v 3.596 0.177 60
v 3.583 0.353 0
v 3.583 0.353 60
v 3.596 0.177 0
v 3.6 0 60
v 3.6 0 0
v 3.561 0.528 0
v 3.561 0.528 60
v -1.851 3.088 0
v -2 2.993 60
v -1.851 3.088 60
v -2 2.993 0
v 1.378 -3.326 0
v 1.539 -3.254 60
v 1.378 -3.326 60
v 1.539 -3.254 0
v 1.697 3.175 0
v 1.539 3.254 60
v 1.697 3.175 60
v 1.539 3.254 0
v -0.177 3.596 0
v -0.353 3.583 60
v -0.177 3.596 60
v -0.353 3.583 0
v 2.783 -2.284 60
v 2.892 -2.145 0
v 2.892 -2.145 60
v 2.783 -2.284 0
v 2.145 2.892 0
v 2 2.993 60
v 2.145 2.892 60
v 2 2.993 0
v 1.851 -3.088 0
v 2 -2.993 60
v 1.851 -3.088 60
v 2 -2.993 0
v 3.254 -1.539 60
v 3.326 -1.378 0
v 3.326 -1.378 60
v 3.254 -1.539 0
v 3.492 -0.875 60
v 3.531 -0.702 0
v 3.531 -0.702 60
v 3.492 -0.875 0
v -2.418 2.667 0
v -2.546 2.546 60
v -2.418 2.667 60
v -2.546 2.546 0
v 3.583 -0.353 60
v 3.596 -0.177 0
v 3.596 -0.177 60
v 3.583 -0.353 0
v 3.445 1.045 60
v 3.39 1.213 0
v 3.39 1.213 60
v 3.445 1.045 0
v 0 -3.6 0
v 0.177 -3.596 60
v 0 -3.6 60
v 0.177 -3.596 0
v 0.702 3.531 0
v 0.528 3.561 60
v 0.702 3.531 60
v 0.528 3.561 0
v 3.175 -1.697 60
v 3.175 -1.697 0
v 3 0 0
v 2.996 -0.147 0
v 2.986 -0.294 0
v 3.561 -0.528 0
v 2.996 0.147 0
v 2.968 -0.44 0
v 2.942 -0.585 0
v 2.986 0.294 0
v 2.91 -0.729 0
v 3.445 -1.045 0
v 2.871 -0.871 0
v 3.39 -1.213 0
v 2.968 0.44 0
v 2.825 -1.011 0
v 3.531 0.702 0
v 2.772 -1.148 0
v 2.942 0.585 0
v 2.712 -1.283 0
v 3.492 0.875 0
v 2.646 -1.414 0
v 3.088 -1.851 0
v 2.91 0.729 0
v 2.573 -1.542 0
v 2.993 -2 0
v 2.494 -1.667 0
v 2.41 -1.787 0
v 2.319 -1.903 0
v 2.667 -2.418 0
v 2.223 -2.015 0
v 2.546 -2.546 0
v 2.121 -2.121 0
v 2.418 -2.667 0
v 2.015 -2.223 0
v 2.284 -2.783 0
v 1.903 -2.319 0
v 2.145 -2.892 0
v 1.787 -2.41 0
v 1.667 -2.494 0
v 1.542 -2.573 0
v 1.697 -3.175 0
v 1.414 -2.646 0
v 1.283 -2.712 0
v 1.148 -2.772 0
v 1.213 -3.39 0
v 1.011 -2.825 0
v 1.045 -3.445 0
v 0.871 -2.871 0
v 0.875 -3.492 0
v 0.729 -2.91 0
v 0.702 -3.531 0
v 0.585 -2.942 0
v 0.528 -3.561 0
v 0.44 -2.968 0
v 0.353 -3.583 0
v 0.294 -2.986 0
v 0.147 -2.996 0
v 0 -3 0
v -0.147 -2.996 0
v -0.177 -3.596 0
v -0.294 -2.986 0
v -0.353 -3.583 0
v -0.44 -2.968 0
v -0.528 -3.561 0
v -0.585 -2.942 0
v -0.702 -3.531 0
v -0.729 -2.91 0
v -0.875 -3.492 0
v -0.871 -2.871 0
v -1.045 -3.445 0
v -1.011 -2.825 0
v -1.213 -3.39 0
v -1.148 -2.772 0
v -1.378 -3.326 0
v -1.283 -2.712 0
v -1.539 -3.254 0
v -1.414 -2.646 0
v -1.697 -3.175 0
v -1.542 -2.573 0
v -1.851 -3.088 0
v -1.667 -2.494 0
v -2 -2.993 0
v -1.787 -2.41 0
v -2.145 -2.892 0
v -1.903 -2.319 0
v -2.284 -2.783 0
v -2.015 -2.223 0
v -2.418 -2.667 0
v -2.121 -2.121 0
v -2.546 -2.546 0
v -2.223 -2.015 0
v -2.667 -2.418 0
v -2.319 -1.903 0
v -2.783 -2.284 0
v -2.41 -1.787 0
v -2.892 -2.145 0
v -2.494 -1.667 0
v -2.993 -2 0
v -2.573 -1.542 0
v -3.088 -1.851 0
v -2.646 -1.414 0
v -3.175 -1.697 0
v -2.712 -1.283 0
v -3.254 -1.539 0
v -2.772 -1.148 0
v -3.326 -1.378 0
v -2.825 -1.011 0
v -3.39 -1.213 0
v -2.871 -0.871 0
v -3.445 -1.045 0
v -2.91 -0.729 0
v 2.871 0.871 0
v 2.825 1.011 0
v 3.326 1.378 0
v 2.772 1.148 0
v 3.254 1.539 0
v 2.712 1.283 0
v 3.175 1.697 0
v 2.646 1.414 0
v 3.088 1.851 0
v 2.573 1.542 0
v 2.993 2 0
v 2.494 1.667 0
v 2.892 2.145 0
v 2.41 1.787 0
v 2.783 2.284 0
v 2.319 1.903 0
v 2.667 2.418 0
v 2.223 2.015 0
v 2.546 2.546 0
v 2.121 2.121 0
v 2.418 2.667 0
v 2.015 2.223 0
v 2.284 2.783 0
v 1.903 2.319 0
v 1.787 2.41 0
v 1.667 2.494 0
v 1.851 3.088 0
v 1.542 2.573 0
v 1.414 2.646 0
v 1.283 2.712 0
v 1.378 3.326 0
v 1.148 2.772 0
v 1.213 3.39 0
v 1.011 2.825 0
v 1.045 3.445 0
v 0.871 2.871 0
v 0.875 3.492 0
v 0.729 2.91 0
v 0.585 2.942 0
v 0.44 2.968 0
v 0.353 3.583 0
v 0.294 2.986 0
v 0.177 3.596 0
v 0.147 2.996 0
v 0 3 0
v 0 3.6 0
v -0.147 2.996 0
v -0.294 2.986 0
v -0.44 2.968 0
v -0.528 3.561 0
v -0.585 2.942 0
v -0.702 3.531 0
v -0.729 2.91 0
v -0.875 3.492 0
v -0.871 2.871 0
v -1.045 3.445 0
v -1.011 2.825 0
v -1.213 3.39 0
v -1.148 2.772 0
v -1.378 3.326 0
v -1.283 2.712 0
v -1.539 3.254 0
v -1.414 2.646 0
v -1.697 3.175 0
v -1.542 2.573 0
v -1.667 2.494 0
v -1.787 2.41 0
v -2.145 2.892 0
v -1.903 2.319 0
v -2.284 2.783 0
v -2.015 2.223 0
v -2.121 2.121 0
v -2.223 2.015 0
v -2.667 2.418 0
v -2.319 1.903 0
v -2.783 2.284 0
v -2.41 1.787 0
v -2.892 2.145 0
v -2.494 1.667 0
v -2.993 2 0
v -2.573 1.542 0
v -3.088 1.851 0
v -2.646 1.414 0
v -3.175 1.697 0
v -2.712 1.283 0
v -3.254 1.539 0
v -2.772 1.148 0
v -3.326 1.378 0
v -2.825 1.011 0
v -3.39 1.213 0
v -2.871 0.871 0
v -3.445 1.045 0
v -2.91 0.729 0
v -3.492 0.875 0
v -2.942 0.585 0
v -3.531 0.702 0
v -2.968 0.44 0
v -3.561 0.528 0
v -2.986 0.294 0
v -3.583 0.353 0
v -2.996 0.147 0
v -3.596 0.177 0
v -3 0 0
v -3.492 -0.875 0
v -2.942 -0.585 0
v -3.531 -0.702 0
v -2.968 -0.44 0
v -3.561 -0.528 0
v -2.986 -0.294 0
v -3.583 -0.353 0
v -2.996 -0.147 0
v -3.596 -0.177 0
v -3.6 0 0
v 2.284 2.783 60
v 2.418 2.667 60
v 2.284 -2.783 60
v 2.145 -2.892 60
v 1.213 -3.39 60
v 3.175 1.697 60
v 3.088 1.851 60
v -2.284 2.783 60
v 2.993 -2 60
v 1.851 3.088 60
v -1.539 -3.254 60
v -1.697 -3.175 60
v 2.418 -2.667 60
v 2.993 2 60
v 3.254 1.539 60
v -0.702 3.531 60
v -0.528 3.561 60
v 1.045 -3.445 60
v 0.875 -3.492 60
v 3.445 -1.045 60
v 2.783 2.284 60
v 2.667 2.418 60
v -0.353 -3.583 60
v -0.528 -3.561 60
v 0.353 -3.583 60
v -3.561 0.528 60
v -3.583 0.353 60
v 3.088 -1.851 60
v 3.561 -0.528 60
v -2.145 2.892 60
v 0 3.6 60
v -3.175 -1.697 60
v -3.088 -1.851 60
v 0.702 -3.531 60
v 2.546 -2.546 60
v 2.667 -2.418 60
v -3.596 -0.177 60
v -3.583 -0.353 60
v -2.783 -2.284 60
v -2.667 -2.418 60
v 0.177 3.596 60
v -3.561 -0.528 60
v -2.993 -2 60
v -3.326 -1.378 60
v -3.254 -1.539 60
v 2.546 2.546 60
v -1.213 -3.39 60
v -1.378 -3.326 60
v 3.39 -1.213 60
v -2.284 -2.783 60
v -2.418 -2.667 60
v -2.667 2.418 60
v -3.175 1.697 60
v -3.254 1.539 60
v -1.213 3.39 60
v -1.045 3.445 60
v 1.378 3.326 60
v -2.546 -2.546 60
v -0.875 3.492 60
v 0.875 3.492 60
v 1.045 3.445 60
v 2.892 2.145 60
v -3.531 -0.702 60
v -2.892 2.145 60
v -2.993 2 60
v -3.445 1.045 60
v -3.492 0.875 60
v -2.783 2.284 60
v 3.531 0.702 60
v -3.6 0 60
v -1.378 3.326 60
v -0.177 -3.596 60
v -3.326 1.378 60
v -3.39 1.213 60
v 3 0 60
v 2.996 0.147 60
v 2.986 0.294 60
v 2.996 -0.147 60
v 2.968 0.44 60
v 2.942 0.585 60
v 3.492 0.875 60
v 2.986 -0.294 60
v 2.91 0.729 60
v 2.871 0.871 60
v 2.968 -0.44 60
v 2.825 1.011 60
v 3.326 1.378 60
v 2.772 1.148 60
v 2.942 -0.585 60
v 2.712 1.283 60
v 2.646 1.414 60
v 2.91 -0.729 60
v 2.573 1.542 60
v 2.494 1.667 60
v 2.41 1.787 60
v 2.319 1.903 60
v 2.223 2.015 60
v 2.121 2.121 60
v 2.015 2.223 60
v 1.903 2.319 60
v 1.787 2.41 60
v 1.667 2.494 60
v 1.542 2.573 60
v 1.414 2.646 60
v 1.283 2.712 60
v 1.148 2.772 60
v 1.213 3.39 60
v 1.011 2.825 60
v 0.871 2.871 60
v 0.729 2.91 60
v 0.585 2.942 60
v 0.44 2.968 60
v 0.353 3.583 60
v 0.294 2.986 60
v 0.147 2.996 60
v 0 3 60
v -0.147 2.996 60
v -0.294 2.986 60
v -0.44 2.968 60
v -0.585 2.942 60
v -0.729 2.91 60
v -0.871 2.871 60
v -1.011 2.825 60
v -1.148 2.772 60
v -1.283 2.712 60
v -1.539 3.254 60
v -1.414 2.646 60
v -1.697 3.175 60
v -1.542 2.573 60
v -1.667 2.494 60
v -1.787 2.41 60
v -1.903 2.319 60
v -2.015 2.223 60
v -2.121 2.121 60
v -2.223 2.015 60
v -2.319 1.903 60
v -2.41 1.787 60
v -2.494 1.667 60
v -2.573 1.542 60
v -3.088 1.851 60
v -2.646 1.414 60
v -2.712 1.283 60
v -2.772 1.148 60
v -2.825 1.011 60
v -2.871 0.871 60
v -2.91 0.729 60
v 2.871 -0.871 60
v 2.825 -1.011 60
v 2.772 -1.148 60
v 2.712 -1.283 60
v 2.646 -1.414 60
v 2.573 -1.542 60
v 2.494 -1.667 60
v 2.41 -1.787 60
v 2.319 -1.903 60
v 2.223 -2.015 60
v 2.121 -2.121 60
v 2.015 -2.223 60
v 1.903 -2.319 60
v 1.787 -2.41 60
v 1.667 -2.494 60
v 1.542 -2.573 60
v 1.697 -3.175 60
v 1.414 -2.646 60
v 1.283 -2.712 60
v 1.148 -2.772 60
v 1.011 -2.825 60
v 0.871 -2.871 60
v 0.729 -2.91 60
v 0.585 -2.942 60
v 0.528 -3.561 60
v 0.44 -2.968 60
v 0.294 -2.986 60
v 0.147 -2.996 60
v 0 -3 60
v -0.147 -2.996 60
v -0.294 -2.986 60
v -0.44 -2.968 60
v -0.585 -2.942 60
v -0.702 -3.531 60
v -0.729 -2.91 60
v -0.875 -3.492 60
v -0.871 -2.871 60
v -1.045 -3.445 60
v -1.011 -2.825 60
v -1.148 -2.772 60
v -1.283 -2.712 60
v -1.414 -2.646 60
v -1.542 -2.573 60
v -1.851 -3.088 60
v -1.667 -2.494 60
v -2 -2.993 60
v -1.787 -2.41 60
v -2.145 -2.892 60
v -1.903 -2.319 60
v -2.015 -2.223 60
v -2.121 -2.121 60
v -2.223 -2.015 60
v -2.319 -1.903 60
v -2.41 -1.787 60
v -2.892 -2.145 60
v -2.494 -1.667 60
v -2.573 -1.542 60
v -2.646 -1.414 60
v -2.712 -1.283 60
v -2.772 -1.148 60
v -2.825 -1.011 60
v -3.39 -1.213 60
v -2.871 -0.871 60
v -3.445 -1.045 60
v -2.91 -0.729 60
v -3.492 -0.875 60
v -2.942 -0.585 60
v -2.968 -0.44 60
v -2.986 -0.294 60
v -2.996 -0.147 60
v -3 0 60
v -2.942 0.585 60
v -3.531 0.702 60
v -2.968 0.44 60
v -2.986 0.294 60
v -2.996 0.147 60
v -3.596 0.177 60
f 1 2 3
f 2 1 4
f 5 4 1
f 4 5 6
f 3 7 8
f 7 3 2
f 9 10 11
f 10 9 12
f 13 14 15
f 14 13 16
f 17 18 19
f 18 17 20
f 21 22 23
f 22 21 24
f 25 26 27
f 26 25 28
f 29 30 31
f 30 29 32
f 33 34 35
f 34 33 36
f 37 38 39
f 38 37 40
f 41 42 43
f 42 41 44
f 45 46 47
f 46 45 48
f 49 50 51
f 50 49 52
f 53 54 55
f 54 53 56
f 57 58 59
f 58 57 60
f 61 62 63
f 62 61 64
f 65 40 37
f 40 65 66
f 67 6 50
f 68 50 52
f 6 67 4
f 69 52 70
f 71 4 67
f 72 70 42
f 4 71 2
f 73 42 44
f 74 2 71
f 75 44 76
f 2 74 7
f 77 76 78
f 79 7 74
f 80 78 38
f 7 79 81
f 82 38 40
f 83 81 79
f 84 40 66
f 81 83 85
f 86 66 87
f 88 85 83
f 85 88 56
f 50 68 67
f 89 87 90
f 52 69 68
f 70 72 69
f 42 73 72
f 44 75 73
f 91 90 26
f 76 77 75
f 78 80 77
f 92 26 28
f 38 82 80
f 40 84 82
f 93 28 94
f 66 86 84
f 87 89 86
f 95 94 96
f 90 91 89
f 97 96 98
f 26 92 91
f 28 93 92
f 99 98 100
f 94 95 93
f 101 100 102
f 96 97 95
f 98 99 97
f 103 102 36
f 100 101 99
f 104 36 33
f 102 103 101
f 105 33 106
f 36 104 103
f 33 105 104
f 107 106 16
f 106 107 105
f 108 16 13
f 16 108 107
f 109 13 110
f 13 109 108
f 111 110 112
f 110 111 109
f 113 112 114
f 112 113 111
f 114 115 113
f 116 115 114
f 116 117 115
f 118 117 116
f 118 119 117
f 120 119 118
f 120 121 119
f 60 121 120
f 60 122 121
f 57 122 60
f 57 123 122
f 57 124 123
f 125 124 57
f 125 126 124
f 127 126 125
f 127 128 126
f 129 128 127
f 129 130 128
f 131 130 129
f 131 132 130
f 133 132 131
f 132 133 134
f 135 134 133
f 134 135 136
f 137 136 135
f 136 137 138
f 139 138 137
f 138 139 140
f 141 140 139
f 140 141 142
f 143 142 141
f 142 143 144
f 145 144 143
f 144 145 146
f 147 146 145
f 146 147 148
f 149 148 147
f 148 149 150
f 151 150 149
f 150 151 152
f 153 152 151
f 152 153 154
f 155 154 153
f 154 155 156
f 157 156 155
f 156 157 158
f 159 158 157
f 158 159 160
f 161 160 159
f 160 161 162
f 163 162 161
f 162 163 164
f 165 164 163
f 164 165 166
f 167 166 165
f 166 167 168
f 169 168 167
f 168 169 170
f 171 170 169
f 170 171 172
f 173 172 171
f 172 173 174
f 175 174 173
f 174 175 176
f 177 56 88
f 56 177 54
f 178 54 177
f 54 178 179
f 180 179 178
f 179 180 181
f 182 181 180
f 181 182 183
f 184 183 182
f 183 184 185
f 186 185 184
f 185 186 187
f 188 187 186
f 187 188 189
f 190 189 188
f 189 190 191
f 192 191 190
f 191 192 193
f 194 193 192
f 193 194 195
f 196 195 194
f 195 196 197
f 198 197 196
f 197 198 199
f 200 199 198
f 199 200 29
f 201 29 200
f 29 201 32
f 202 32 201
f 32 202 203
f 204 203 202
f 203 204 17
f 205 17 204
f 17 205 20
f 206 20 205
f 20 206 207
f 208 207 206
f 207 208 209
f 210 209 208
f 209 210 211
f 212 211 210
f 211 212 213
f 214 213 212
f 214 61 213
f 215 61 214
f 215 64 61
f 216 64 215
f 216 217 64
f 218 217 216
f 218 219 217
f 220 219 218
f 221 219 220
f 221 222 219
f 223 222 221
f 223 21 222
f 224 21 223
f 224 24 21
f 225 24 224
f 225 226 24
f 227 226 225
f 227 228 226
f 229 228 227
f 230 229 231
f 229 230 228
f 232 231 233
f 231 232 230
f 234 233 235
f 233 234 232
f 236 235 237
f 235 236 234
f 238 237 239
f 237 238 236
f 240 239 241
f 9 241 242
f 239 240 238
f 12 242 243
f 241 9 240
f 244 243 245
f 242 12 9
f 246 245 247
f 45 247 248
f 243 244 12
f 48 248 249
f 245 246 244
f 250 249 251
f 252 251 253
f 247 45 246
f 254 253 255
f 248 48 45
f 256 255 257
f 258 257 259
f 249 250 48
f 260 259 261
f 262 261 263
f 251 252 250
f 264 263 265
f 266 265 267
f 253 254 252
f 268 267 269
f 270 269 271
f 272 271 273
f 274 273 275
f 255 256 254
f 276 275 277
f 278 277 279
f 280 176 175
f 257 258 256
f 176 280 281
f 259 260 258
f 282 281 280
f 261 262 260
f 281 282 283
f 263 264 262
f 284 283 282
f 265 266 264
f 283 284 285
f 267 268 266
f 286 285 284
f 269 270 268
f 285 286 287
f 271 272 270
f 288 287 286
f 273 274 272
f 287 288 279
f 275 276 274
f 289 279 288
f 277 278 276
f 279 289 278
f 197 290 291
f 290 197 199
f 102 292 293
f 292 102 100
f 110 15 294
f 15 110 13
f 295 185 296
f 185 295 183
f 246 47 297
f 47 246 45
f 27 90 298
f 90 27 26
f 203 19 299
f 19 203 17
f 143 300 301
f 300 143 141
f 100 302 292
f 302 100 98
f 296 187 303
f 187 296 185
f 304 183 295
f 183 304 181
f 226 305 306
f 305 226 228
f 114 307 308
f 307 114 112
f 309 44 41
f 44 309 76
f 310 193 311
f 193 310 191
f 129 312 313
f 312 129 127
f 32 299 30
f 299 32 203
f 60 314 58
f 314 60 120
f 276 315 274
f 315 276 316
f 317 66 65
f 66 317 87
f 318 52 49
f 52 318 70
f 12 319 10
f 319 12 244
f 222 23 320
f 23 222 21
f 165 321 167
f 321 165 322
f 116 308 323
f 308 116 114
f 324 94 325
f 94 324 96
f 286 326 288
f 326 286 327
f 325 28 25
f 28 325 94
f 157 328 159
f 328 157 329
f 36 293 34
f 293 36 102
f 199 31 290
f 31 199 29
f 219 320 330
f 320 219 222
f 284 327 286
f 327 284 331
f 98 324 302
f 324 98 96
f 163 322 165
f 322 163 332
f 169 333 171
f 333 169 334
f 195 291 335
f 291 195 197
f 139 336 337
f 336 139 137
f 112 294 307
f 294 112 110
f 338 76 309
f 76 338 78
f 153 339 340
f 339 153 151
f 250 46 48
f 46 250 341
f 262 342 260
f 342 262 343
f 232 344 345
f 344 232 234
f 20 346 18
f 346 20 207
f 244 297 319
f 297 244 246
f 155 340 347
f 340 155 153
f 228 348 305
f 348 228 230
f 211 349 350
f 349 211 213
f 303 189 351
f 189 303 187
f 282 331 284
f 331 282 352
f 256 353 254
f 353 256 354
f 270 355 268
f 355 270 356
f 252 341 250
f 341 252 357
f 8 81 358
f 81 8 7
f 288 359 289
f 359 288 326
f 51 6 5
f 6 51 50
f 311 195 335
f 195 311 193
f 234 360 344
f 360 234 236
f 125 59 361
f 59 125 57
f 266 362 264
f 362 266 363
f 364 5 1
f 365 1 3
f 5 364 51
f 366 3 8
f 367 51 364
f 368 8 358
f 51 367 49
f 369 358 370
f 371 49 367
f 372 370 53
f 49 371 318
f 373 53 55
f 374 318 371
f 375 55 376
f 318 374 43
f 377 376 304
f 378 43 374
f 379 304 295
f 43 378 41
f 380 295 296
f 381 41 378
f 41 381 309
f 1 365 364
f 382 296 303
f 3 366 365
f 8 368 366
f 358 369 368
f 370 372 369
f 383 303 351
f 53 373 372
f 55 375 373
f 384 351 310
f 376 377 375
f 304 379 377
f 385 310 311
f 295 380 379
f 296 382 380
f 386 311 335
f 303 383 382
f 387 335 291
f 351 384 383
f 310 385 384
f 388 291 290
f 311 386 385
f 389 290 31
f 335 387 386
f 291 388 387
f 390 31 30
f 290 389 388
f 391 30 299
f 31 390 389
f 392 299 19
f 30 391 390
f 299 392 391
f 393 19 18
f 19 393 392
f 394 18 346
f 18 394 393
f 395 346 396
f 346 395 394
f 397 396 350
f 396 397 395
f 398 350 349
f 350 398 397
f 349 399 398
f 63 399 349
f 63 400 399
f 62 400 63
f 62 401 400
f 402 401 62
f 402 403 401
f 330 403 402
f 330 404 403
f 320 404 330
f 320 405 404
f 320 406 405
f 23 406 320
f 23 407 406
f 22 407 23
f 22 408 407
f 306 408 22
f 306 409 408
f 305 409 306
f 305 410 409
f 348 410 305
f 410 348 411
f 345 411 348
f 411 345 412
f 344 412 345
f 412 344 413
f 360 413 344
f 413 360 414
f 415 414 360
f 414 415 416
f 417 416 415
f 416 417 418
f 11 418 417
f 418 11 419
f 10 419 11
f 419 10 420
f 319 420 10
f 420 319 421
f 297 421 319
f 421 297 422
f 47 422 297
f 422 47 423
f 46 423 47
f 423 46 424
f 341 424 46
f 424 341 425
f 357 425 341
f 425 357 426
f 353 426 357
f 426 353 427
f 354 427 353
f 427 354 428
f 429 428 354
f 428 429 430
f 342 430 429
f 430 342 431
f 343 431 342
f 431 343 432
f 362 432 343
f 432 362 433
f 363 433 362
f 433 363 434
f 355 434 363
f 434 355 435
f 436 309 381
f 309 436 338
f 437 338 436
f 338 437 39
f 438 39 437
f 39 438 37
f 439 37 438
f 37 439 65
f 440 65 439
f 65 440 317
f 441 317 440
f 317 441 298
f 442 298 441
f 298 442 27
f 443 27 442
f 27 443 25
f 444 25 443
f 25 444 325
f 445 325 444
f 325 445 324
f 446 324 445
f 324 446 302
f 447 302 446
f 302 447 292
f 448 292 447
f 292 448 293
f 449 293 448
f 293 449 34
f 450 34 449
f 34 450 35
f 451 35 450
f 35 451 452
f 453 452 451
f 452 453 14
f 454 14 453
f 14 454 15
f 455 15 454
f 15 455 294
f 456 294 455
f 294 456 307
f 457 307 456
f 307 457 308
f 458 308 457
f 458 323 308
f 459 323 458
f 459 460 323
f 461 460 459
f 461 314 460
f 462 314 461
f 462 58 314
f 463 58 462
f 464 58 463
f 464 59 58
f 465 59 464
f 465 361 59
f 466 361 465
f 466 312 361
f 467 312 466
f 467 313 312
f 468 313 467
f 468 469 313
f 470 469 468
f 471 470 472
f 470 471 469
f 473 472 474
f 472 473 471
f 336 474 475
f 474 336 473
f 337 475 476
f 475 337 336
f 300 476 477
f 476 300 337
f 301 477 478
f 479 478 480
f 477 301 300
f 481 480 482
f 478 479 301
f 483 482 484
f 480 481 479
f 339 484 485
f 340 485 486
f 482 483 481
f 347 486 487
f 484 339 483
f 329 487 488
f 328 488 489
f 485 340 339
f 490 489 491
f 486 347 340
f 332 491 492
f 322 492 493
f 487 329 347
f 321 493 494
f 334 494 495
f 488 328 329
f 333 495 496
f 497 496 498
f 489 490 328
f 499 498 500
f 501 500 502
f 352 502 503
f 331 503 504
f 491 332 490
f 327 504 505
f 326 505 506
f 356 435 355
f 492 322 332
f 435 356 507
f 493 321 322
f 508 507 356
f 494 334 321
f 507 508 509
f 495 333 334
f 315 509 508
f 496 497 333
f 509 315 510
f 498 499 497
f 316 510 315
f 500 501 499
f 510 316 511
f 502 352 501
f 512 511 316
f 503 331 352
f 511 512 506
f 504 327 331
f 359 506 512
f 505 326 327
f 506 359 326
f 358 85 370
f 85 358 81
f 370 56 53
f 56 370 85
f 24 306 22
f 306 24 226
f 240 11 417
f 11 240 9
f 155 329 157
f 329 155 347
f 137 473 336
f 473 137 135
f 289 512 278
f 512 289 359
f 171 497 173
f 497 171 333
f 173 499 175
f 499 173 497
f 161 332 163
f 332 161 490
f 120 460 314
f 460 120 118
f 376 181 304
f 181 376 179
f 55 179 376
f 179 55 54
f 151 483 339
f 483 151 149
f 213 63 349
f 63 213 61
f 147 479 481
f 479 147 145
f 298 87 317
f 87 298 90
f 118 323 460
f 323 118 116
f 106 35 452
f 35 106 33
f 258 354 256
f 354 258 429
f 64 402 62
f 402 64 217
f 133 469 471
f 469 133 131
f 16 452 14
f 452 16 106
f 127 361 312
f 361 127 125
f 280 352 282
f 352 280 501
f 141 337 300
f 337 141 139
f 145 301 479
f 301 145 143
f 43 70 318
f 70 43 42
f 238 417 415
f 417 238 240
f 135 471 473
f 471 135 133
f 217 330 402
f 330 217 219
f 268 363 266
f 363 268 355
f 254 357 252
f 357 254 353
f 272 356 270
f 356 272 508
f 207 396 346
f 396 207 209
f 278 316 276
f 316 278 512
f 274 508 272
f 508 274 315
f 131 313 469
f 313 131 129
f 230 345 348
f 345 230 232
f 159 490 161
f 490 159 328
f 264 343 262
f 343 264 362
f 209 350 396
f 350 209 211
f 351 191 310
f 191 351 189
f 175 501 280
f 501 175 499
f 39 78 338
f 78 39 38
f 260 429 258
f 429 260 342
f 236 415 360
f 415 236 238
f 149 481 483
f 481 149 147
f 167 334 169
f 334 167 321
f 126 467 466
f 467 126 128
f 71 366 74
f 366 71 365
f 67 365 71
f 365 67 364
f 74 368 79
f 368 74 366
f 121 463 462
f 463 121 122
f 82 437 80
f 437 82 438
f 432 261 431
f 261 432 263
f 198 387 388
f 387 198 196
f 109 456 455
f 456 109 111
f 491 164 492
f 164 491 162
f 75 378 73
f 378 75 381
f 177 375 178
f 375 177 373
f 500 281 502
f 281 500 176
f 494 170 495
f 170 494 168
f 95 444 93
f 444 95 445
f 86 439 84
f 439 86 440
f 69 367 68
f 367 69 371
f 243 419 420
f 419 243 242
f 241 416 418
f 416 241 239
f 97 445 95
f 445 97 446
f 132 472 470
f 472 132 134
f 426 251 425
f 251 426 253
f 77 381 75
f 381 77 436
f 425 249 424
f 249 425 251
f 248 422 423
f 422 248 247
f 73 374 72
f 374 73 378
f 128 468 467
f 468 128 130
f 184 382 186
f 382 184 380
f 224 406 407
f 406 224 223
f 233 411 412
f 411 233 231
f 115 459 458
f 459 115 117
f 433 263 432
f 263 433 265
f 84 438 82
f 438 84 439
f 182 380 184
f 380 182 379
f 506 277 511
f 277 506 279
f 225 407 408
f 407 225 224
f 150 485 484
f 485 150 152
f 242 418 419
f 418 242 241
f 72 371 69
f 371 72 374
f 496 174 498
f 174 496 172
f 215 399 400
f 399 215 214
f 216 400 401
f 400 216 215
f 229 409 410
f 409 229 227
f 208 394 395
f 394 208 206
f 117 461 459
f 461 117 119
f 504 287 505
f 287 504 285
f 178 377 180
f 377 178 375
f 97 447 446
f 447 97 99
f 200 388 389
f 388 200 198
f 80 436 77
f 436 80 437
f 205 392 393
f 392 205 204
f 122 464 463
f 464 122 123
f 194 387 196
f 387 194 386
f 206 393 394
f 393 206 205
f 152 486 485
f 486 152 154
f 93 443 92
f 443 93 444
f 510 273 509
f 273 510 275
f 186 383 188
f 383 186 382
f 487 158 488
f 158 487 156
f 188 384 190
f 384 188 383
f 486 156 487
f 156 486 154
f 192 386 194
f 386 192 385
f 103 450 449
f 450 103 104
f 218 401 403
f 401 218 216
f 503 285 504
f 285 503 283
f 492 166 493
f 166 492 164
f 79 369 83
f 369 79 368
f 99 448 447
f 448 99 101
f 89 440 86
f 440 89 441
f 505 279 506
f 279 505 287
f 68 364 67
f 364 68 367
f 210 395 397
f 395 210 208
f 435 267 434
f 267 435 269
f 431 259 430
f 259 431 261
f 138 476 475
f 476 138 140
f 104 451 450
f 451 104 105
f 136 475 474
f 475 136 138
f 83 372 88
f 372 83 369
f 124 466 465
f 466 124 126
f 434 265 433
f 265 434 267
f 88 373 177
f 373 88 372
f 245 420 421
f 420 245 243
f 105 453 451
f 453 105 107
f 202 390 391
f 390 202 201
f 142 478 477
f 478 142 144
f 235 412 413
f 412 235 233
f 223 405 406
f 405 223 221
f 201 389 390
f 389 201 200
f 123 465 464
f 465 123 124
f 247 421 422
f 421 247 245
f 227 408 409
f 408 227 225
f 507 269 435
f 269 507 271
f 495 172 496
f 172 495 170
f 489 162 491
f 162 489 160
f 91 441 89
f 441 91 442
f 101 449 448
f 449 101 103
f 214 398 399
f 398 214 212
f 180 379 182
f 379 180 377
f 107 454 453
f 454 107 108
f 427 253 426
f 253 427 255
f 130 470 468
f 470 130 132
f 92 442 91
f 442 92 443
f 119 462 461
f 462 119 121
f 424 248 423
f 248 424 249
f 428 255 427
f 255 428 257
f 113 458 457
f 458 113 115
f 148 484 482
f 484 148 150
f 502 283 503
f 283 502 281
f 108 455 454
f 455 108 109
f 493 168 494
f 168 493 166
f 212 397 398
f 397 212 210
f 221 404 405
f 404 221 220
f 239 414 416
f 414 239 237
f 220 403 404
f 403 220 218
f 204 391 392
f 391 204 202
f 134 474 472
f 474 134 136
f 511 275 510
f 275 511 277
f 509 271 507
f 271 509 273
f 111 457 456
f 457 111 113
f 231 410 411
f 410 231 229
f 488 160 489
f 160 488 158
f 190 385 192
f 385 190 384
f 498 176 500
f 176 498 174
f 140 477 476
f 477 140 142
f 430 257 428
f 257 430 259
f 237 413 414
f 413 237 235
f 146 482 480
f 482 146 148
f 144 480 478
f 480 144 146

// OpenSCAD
$fn = 128;

// Heatshrink sleeving (tubing)
inner_d = 6;          // mm
wall = 0.6;           // mm
length = 60;          // mm

outer_d = inner_d + 2*wall;

difference() {
  cylinder(h = length, d = outer_d, center = false);
  translate([0,0,-0.5])
    cylinder(h = length + 1, d = inner_d, center = false);
}
